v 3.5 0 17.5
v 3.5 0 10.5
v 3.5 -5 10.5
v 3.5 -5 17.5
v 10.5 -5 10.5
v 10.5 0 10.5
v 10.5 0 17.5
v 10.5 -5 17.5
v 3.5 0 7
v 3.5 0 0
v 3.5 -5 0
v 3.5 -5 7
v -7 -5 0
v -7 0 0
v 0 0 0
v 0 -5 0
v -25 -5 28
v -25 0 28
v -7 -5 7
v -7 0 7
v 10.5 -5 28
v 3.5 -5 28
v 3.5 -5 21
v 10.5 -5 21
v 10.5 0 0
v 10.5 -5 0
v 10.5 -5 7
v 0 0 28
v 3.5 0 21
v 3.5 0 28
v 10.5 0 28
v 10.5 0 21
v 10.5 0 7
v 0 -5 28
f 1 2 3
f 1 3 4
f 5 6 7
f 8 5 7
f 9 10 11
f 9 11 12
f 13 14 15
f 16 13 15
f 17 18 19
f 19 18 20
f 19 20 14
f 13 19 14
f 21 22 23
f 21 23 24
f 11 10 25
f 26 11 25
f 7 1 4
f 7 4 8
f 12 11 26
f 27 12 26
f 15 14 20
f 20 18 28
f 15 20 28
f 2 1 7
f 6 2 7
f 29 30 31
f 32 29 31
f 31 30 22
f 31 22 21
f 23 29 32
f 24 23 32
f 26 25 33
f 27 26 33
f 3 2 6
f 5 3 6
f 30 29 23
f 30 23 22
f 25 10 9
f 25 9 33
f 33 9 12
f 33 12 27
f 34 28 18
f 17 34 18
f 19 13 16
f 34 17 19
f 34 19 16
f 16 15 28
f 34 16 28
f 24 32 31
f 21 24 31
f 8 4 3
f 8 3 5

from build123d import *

# Parameters (mm, degrees)
F0_W     = 7
F0_H     = 7
F1_DEPTH = 5


with BuildPart() as f1:
    # F0 (on Front) → F1 (new body)
    with BuildSketch(Plane.XZ):
        Polygon((0, 28), (-25, 28), (-7, 7), (-7, 0), (0, 0), align=None)
        with Locations((7, 24.5)):
            Rectangle(F0_W, F0_H)
        with Locations((7, 14)):
            Rectangle(F0_W, F0_H)
        with Locations((7, 3.5)):
            Rectangle(F0_W, F0_H)
    extrude(amount=F1_DEPTH)


solid = f1.part
